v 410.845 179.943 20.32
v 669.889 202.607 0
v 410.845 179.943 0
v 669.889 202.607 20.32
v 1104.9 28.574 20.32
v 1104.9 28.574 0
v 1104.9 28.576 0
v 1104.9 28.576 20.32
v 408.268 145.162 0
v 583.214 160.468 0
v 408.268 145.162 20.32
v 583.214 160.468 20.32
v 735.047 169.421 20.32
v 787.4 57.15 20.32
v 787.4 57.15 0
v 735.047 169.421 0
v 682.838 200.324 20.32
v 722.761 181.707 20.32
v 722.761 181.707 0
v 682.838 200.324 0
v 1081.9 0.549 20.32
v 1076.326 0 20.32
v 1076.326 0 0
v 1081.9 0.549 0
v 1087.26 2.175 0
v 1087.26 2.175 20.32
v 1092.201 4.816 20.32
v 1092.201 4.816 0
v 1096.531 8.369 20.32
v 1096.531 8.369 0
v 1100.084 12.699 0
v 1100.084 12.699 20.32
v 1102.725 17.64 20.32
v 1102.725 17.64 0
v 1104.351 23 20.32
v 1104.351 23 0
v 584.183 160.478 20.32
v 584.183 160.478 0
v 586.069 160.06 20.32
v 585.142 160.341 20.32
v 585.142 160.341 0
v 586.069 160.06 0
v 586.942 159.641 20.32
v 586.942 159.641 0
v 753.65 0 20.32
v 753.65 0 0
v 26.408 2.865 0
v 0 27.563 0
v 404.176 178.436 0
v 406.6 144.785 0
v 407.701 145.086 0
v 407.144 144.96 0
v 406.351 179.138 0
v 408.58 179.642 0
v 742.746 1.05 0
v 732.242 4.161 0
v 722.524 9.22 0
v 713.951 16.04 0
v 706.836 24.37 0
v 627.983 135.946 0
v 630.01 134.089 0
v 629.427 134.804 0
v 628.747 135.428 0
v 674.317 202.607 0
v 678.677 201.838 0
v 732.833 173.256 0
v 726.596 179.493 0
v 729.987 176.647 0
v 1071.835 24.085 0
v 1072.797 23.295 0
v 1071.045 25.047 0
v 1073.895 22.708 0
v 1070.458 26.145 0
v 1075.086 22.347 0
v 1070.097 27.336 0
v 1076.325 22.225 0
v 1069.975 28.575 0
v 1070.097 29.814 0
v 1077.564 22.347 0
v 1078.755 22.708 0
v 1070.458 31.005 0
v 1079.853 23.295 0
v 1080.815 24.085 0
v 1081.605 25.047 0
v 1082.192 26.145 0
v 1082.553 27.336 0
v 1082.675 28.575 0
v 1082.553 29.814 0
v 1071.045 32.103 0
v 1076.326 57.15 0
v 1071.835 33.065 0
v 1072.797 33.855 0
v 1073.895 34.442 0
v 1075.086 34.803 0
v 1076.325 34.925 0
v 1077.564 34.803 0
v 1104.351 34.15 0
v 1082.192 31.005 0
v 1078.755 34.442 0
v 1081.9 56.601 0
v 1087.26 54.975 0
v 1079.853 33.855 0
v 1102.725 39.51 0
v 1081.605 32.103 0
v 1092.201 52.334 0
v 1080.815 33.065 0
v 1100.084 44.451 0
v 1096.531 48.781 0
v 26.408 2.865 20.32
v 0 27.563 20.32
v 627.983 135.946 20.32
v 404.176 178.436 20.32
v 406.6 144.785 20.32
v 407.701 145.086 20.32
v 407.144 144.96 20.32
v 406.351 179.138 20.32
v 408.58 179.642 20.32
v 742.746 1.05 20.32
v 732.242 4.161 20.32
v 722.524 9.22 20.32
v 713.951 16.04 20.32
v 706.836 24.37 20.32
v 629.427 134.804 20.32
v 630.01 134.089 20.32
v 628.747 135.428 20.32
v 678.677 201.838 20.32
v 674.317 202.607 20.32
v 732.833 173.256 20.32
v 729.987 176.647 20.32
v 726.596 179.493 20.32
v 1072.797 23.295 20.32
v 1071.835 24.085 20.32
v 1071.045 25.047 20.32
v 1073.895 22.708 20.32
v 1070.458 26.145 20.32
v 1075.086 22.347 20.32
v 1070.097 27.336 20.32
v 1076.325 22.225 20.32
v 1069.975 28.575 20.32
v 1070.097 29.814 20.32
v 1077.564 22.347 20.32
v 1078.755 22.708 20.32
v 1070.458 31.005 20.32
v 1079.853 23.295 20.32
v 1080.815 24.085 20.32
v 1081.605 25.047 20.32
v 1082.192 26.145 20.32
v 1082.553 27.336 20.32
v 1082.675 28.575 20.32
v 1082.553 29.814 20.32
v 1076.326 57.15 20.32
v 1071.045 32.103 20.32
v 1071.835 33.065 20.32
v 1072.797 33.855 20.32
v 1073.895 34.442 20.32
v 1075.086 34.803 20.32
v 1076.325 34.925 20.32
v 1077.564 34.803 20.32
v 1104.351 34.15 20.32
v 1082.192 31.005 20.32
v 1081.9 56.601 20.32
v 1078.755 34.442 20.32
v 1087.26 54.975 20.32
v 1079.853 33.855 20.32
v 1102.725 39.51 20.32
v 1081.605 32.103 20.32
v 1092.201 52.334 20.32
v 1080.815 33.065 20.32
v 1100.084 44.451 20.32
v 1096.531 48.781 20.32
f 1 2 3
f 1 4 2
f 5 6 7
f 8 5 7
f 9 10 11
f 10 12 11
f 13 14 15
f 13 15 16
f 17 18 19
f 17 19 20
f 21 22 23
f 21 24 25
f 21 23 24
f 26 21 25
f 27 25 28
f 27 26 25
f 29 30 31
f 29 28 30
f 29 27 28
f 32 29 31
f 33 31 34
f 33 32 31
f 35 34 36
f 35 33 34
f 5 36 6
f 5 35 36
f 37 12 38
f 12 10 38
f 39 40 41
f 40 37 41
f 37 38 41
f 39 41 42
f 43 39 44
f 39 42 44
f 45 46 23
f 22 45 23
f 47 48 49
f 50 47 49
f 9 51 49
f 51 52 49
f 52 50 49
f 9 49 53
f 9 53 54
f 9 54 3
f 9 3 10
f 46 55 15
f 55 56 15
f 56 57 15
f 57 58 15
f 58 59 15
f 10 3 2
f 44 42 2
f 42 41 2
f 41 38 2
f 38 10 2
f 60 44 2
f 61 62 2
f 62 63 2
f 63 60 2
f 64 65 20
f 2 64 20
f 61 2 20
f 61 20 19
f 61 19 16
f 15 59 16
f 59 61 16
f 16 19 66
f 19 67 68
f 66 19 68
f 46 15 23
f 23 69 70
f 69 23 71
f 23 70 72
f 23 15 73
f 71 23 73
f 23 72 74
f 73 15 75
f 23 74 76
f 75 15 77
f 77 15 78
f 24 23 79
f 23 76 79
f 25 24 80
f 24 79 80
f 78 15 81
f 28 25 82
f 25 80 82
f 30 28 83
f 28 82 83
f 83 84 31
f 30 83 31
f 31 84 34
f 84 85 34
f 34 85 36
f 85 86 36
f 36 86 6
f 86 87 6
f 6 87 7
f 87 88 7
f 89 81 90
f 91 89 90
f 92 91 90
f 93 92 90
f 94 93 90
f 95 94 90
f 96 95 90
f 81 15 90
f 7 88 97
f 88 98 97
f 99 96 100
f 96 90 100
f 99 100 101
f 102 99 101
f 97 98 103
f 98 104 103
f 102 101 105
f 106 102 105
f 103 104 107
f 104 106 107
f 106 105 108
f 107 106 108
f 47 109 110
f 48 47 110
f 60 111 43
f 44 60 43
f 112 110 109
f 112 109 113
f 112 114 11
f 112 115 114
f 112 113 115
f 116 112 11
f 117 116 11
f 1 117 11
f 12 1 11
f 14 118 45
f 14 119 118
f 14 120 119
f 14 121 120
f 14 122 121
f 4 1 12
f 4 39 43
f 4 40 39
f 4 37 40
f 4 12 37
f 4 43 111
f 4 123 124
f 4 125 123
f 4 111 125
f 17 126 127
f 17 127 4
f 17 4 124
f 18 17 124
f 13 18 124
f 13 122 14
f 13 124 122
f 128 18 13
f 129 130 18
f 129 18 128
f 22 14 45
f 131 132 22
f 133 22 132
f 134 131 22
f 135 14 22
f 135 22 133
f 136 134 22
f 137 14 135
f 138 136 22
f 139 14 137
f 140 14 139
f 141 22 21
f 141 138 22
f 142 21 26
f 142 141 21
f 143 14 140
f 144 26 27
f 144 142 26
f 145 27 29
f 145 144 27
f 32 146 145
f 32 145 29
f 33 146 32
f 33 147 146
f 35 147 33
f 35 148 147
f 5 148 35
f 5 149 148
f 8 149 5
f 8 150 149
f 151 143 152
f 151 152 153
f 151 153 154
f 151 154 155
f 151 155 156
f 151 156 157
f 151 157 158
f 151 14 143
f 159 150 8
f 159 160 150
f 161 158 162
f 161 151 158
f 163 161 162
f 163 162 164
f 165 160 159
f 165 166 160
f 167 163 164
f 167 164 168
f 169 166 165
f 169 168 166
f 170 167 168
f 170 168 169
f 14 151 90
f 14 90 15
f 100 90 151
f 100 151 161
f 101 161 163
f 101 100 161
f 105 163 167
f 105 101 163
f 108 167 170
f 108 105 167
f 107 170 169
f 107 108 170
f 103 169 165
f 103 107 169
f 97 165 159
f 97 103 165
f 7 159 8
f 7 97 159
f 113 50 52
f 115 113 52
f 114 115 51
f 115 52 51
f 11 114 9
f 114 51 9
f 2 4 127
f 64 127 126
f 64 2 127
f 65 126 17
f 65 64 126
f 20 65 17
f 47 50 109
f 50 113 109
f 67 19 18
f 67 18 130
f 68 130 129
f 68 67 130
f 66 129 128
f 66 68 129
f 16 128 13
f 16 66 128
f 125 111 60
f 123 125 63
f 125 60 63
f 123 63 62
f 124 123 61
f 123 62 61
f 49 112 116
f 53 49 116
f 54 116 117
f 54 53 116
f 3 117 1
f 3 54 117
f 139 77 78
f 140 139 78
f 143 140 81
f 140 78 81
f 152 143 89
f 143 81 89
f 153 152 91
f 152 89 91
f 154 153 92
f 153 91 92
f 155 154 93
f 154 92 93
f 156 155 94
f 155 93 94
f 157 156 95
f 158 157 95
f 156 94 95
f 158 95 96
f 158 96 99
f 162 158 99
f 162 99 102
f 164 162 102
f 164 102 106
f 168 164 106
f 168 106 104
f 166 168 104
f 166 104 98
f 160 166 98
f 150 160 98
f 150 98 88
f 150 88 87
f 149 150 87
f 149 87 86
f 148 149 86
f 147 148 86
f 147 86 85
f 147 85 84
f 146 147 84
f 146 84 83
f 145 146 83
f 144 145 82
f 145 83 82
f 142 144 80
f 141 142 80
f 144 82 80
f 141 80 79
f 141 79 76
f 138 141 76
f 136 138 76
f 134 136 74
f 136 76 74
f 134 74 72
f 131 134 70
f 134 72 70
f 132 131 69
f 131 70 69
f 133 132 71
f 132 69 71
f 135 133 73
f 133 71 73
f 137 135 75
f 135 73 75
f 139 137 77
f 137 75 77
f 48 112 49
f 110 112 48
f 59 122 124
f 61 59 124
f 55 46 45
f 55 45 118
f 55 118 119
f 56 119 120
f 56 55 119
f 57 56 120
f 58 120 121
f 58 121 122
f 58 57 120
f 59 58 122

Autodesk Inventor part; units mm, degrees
ref_plane "YZ Plane" through (0, 0, 0) normal (1, 0, 0) x (0, 1, 0)
ref_plane "XZ Plane" through (0, 0, 0) normal (0, 1, 0) x (-1, 0, 0)
ref_plane "XY Plane" through (0, 0, 0) normal (0, 0, 1) x (1, 0, 0)
sketch "Sketch1" plane through (0, 0, 0) normal (0, 0, 1) x (1, 0, 0)
  line L0 (0, 0) -> (1104.9, 0)
  line L1 (1104.9, 0) -> (1104.9, 203.2)
  line L2 (1104.9, 203.2) -> (0, 203.2)
  line L3 (0, 203.2) -> (0, 0)
  dimension "d0" = 1104.9
  dimension "d1" = 203.2
extrude "Extrusion1" add sketch "Sketch1" along normal blind 20.32
sketch "Sketch2" plane through (0, 0, 20.32) normal (0, 0, 1) x (1, 0, 0)
  line L0 (1104.9, 0) -> (1104.9, 203.2) projected
  line L1 (0, 0) -> (1104.9, 0) projected
  line L2 (1104.9, 57.15) -> (723.9, 57.15)
  line L3 (723.9, 57.15) -> (723.9, 0)
  line L4 (723.9, 0) -> (1104.9, 0)
  line L5 (1104.9, 0) -> (1104.9, 57.15)
  line L6 (723.9, 0) -> (629.2025, 135.242)
  line L7 (723.9, 0) -> (671.9967, -36.3431)
  line L8 (629.2025, 135.242) -> (585.2084, 160.642)
  line L9 (585.2084, 160.642) -> (407.4084, 145.0865)
  line L10 (787.4, 57.15) -> (731.14, 177.8)
  line L11 (731.14, 177.8) -> (676.6695, 203.2)
  line L12 (1104.9, 203.2) -> (0, 203.2) projected
  line L13 (676.6695, 203.2) -> (407.4084, 179.6427)
  line L14 (787.4, 57.15) -> (723.9, 57.15)
  line L15 (723.9, 57.15) -> (723.9, 0)
  line L16 (407.4084, 179.6427) -> (0, 27.5632)
  line L17 (407.4084, 145.0865) -> (26.4084, 2.8648)
  line L18 (0, 203.2) -> (0, 0) projected
  line L19 (26.4084, 2.8648) -> (0, 27.5632)
  line L20 (407.4084, 145.0865) -> (365.4136, 141.4124)
  dimension "d4" = 57.15
  dimension "d5" = 381
  dimension "d6" = 125
  dimension "d7" = 165.1
  dimension "d8" = 50.8
  dimension "d9" = 155
  dimension "d10" = 145
  dimension "d11" = 177.8
  dimension "d12" = 317.5
  dimension "d13" = 115
  dimension "d14" = 120.65
  dimension "d15" = 140
  dimension "d16" = 0
  dimension "d18" = 381
  dimension "d19" = 0
  dimension "d33" = 15.47
extrude "Extrusion2" cut sketch "Sketch2" against normal blind 20.32 contours L2 L10 L11 L12 L0 | L1 L18 L19 L17 L9 L8 L6 | L13 L16 L18 L12
fillet "Fillet1" radius 28.575 2 edges at (1104.9, 0, 10.16) (1104.9, 57.15, 10.16)
fillet "Fillet2" radius 57.15 1 edges at (723.9, 0, 10.16)
fillet "Fillet3" radius 6.35 3 edges at (629.2025, 135.242, 10.16) (585.2084, 160.642, 10.16) (407.4084, 145.0865, 10.16)
fillet "Fillet4" radius 25.4 3 edges at (676.6695, 203.2, 10.16) (731.14, 177.8, 10.16) (407.4084, 179.6427, 10.16)
sketch "Sketch3" plane through (0, 0, 0) normal (0, 0, -1) x (-1, 0, 0)
  circle A0 centre (-1076.325, 28.575) radius 6.35
  line L0 (-753.6504, 0) -> (-1076.325, 0) projected
  arc A1 (-1076.325, 57.15) -> (-1076.325, 0) centre (-1076.325, 28.575) ccw projected
  point P0 (0, 0)
  dimension "d26" = 12.7
  dimension "d29" = 0
  dimension "d30" = 0
extrude "Extrusion3" cut sketch "Sketch3" against normal blind 20.32
properties part number "Kermit Mount"
